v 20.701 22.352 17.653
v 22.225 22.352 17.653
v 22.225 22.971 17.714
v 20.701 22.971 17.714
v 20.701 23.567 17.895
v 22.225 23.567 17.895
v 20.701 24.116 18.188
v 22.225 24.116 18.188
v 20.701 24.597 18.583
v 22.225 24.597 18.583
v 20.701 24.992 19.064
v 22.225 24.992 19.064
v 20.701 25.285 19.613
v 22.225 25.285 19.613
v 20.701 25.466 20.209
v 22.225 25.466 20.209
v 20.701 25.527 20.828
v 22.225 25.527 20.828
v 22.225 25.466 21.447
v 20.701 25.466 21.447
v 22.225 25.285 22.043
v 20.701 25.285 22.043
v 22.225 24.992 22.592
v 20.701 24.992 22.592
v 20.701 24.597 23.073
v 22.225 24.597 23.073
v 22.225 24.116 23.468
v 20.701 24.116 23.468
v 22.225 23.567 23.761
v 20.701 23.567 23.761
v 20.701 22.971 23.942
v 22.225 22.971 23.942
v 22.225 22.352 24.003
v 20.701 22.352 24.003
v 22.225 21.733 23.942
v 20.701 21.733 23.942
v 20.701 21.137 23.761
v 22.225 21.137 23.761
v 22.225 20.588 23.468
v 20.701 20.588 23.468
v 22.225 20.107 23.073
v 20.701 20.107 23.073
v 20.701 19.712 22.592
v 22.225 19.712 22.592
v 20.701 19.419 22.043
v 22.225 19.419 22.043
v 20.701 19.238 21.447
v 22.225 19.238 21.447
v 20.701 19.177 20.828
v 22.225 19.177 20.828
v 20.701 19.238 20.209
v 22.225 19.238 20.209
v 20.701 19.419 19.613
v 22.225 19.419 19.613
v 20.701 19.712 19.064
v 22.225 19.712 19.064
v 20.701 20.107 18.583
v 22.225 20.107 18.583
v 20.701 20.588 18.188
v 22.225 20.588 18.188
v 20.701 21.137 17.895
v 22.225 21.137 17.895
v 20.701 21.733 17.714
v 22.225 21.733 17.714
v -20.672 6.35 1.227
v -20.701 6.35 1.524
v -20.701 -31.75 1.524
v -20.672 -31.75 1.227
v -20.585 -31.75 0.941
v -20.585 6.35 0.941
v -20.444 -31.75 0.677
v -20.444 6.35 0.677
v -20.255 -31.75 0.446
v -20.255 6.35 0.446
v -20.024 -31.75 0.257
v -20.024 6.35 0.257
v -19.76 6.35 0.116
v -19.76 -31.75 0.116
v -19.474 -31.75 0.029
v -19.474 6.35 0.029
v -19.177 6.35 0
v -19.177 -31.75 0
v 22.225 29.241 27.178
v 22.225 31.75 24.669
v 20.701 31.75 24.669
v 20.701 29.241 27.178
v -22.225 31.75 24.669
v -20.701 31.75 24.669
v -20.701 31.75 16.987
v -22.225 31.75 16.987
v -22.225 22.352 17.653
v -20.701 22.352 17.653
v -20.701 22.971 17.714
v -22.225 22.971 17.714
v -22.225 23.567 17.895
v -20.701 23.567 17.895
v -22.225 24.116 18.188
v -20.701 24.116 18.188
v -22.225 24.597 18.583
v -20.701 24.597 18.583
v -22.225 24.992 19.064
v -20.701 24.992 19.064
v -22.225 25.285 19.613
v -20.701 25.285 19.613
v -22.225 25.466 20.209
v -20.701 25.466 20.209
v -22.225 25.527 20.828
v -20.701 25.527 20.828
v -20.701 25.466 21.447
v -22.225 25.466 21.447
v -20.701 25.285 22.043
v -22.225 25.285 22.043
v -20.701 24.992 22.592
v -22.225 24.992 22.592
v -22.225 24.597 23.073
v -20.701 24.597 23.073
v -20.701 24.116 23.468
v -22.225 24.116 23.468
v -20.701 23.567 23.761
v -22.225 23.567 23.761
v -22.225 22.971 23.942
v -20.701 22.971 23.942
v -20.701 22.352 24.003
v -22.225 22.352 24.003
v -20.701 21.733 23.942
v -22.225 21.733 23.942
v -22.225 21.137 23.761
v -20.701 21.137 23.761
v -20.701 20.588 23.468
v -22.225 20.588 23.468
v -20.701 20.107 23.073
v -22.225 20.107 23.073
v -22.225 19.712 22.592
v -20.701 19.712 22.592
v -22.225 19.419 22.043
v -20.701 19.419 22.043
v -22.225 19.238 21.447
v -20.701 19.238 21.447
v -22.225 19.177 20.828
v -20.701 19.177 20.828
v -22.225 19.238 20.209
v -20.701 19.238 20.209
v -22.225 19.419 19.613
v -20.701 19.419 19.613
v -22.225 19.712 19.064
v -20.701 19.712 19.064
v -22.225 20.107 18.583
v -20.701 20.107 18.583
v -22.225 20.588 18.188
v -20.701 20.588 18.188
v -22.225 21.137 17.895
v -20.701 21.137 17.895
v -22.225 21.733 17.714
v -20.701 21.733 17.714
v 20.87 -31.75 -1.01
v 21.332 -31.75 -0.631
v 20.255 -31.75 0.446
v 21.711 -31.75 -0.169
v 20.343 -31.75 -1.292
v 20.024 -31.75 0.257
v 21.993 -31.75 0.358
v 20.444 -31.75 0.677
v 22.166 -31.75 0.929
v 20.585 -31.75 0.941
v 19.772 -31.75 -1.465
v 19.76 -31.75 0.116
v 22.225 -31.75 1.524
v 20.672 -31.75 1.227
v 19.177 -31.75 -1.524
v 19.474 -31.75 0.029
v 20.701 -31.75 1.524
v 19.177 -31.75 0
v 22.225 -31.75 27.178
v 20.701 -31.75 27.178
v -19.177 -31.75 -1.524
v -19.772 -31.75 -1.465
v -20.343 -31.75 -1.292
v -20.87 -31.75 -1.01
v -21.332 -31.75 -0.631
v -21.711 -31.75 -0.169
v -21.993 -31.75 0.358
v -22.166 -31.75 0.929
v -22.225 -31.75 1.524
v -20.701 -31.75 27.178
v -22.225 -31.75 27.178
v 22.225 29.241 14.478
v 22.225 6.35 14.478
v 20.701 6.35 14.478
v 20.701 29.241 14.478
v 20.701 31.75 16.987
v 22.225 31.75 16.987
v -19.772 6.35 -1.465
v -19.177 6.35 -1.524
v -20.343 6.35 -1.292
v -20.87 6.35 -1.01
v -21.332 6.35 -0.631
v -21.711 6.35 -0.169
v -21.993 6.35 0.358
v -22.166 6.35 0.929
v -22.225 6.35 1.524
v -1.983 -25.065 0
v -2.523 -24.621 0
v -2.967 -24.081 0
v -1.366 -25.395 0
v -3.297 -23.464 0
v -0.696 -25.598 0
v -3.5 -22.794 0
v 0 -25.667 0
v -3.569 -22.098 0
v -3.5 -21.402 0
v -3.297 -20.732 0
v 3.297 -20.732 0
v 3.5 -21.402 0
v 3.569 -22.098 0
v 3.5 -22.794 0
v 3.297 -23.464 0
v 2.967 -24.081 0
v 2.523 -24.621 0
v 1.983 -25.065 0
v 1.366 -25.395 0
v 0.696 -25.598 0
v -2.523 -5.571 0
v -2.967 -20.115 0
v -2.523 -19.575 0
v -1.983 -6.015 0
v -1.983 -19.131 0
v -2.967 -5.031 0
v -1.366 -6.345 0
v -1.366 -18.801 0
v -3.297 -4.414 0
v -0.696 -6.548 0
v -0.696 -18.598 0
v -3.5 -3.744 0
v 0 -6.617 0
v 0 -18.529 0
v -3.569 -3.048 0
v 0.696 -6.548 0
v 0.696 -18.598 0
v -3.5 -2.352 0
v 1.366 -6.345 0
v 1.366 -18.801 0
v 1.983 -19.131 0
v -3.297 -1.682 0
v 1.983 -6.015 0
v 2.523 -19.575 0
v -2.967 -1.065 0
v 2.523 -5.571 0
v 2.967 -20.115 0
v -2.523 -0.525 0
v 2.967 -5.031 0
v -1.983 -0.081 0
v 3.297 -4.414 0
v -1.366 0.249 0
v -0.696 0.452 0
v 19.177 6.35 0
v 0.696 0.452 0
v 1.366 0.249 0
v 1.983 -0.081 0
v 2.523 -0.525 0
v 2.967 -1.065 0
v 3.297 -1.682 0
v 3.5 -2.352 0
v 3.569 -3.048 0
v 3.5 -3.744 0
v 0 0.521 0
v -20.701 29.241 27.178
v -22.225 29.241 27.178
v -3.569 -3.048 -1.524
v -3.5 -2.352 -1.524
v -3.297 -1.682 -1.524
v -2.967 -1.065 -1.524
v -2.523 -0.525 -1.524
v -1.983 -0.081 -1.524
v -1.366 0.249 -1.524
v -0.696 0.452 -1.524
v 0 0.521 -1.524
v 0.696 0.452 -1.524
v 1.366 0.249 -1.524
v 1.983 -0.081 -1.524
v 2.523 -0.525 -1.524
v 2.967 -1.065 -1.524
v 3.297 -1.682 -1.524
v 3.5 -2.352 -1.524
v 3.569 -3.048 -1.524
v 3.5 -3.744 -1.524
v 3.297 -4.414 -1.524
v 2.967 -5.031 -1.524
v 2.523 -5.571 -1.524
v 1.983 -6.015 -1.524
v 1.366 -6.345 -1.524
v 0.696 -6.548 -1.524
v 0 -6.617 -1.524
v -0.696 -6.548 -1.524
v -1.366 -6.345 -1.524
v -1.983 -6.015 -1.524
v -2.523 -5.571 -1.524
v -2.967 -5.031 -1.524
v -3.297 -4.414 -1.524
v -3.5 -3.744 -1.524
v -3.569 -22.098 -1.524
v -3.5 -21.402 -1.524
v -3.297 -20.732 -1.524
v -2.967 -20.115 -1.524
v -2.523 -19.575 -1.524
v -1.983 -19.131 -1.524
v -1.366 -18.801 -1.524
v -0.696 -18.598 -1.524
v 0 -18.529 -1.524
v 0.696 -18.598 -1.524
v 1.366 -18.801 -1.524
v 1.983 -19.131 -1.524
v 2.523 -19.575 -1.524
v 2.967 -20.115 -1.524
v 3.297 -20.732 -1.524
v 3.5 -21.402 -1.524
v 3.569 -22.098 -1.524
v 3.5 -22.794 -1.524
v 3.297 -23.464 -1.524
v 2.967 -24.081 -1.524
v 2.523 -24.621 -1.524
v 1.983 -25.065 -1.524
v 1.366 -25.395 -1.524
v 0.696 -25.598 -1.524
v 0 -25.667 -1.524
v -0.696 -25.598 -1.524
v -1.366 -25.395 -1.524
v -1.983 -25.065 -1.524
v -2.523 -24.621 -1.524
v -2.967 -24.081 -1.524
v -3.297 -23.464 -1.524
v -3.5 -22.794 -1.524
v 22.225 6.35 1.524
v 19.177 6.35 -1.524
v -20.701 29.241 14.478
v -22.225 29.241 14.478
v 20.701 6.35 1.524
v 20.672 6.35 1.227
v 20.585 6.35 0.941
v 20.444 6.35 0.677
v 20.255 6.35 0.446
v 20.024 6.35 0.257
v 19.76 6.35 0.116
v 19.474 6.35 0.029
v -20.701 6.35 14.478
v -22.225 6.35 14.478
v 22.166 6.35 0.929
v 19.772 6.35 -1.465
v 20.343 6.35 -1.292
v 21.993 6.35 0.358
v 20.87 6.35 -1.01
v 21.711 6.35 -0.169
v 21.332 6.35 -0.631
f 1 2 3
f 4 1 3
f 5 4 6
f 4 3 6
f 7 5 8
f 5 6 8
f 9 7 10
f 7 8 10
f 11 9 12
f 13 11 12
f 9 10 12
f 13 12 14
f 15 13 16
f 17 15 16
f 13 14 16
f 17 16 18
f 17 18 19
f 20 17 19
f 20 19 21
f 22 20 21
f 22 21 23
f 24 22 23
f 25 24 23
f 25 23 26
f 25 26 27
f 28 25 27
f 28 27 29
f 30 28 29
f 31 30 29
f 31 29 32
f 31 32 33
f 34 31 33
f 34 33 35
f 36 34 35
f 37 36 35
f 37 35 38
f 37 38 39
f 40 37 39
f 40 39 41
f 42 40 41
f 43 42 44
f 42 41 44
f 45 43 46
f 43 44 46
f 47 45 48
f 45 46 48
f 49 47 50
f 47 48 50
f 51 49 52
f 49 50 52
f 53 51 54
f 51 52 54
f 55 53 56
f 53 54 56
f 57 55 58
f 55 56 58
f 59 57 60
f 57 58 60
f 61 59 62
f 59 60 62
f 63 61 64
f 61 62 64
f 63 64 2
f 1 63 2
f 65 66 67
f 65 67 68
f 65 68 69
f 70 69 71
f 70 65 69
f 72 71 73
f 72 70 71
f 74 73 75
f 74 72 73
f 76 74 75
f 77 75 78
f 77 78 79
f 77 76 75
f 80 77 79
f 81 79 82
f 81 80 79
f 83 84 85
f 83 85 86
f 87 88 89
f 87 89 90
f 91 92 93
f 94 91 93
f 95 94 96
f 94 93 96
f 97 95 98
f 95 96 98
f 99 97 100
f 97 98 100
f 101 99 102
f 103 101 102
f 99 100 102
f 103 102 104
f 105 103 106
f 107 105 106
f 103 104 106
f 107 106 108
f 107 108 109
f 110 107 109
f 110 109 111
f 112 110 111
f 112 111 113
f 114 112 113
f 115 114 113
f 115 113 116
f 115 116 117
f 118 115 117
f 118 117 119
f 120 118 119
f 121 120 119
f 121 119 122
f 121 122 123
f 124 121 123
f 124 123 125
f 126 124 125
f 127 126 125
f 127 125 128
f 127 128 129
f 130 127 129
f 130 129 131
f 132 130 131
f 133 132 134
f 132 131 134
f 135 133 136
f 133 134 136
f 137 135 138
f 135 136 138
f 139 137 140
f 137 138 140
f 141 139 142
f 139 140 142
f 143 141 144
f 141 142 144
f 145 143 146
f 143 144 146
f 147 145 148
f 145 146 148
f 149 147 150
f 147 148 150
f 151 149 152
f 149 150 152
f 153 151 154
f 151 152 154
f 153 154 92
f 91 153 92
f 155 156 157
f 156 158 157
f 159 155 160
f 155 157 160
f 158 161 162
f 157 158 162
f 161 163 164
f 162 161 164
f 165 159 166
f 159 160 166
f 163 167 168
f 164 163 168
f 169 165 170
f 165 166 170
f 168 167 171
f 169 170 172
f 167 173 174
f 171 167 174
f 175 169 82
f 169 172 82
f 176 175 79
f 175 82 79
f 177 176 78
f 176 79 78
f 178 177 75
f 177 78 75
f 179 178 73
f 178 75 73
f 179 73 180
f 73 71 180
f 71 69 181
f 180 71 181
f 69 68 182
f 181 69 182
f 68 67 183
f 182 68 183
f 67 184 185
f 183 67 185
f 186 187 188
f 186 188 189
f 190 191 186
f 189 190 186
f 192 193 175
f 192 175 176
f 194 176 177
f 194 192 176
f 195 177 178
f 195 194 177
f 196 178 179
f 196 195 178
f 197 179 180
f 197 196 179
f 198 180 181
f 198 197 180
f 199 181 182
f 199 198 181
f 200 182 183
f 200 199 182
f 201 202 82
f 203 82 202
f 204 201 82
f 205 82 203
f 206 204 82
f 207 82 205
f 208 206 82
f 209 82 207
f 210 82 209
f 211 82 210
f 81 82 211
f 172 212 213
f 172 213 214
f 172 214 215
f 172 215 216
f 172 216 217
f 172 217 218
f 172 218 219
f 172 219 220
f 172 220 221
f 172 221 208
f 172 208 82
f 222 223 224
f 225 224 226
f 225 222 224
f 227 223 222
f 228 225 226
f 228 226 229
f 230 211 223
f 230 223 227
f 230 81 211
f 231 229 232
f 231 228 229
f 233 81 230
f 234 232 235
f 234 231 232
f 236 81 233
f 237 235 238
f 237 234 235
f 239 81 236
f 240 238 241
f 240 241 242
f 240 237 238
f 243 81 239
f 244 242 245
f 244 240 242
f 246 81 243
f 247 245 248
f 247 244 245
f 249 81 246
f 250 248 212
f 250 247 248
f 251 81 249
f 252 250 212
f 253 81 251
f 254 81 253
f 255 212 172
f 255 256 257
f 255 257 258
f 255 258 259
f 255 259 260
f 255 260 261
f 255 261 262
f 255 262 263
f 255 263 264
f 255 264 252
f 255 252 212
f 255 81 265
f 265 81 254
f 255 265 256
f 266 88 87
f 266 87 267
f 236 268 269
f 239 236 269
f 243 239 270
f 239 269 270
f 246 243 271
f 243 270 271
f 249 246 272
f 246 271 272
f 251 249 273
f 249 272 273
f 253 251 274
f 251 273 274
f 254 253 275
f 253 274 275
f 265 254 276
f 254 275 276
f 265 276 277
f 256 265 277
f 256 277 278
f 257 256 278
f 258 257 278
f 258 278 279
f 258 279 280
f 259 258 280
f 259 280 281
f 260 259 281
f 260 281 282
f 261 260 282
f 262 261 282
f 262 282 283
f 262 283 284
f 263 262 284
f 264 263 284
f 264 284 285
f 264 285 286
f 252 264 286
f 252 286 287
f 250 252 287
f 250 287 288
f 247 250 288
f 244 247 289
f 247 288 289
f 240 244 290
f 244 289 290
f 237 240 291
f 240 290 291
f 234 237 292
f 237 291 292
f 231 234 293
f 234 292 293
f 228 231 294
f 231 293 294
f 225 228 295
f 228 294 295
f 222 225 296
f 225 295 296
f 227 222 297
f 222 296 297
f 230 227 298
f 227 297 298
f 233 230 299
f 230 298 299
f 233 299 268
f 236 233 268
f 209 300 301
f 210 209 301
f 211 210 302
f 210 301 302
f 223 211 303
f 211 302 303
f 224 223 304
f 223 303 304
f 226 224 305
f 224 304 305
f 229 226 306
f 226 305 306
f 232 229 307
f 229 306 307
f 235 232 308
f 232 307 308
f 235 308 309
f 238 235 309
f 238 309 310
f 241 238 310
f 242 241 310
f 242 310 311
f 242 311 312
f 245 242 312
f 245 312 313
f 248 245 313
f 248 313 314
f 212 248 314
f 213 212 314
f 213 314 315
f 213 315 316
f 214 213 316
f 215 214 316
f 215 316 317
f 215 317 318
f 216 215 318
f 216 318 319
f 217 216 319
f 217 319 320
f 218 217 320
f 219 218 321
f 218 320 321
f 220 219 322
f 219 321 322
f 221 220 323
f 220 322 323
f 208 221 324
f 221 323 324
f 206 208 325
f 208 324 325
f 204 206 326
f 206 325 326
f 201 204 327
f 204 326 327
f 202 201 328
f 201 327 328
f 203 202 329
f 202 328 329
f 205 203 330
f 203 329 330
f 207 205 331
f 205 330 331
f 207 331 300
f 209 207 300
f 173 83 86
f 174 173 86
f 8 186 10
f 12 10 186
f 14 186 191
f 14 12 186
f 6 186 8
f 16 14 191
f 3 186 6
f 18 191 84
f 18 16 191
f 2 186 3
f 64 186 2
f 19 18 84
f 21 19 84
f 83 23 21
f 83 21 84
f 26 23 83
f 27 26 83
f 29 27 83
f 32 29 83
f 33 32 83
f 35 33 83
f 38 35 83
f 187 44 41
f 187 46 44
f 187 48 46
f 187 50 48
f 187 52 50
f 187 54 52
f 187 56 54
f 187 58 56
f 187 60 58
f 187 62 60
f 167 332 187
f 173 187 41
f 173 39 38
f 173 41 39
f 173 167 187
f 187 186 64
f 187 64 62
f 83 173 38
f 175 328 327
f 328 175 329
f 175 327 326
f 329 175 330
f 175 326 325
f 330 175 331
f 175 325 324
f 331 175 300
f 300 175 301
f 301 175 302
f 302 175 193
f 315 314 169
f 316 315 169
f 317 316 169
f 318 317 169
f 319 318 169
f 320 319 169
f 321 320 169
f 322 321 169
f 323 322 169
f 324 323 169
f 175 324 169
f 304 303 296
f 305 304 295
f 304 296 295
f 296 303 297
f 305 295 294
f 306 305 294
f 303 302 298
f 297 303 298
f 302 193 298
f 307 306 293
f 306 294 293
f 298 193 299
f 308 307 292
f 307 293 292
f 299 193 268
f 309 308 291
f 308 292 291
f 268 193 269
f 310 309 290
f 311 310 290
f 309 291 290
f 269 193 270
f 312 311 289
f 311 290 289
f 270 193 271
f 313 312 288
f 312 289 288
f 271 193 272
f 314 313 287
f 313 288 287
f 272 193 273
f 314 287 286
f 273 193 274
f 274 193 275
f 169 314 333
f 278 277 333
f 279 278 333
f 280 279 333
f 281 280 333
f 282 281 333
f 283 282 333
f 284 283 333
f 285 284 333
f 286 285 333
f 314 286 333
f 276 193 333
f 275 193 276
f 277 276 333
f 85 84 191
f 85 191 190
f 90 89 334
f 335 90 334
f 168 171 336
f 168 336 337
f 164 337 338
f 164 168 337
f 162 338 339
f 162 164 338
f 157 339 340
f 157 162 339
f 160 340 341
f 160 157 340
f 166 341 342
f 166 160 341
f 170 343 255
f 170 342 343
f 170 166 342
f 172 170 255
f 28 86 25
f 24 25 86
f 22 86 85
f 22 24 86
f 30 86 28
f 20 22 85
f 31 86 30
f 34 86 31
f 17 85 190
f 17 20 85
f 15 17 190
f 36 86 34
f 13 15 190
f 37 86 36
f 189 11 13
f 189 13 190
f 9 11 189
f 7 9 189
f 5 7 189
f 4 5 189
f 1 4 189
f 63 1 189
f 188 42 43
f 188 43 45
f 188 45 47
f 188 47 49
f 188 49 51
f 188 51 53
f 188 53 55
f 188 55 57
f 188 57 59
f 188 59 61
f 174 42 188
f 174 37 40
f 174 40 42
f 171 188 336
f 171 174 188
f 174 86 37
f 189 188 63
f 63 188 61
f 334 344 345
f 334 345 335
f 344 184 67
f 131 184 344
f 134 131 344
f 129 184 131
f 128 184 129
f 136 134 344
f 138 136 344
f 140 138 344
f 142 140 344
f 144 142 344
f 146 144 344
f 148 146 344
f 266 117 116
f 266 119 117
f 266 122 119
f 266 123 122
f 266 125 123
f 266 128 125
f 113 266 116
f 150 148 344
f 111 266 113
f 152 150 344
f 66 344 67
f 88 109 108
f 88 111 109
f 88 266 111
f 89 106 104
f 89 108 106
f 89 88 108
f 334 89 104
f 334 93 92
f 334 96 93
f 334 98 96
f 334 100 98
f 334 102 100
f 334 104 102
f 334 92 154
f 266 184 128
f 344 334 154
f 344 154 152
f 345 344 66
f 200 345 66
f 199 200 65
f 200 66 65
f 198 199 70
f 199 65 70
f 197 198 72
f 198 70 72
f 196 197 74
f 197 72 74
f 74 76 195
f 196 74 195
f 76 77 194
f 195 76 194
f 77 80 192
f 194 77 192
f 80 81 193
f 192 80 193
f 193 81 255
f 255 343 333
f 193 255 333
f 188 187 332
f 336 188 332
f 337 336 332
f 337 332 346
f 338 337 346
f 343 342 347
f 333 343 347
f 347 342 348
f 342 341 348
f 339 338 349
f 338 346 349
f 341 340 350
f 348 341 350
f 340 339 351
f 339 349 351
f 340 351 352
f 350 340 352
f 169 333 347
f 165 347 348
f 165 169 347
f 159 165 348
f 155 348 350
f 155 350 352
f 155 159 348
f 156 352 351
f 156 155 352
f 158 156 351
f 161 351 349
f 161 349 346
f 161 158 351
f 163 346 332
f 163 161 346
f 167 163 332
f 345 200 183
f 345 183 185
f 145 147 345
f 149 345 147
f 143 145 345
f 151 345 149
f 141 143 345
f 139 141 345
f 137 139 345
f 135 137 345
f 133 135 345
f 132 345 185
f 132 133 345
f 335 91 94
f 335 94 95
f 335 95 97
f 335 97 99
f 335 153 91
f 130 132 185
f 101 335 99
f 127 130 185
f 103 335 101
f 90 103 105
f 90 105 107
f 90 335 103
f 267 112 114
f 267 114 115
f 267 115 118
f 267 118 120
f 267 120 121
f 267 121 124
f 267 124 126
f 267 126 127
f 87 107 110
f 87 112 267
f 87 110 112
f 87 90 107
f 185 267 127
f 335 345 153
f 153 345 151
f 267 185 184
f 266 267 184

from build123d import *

# Parameters (mm, degrees)
CROQUIS1_W                         = 44.45
CROQUIS1_H                         = 63.5
BRIDA_BASE1_DEPTH                  = 1.524
BRIDA_DE_ARISTA1_STRIP_W           = 9.144
BRIDA_DE_ARISTA1_STRIP_H           = 1.524
BRIDA_DE_ARISTA1_STRIP_CUT_DEPTH   = 63.5
BRIDA_DE_ARISTA1_STRIP_2_W         = 9.144
BRIDA_DE_ARISTA1_STRIP_2_H         = 1.524
BRIDA_DE_ARISTA1_STRIP_CUT_2_DEPTH = 63.5
BRIDA_DE_ARISTA1_DEPTH             = 63.5
BRIDA_DE_ARISTA1_BEND_DEPTH        = 63.5
CROQUIS12_R                        = 3.175
CROQUIS12_W                        = 16.002
CROQUIS12_H                        = 25.4
CORTAR_EXTRUIR1_DEPTH              = 62.738
CROQUIS13_R                        = 3.5687
CORTAR_EXTRUIR2_DEPTH              = 62.738
CORTAR_EXTRUIR3_DEPTH              = 62.738


# Sheet-metal steps are written as plain solids
with BuildPart() as part:
    # Croquis1 → Brida base1 (new body)
    with BuildSketch(Plane.XY):
        Rectangle(CROQUIS1_W, CROQUIS1_H)
    extrude(amount=-BRIDA_BASE1_DEPTH)

    # Brida de arista1 strip (across the edge) → Brida de arista1 strip cut (cut)
    with BuildSketch(Plane(origin=(22.225, -31.75, 0), x_dir=(-1, 0, 0), z_dir=(0, 1, 0))):
        with Locations((-1.524, -0.762)):
            Rectangle(BRIDA_DE_ARISTA1_STRIP_W, BRIDA_DE_ARISTA1_STRIP_H)
    extrude(amount=BRIDA_DE_ARISTA1_STRIP_CUT_DEPTH, mode=Mode.SUBTRACT)

    # Brida de arista1 strip 2 (across the edge) → Brida de arista1 strip cut 2 (cut)
    with BuildSketch(Plane(origin=(-22.225, 31.75, 0), x_dir=(1, 0, 0), z_dir=(0, -1, 0))):
        with Locations((-1.524, -0.762)):
            Rectangle(BRIDA_DE_ARISTA1_STRIP_2_W, BRIDA_DE_ARISTA1_STRIP_2_H)
    extrude(amount=BRIDA_DE_ARISTA1_STRIP_CUT_2_DEPTH, mode=Mode.SUBTRACT)

    # Brida de arista1 section (across the edge) → Brida de arista1 (add)
    with BuildSketch(Plane(origin=(22.225, -31.75, 0), x_dir=(-1, 0, 0), z_dir=(0, 1, 0))):
        with BuildLine():
            Line((0, 1.524), (0, 27.178))
            Line((0, 27.178), (1.524, 27.178))
            Line((1.524, 27.178), (1.524, 1.524))
            ThreePointArc((1.524, 1.524), (1.970369265, 0.446369265), (3.048, 0))
            Line((3.048, 0), (3.048, -1.524))
            ThreePointArc((3.048, -1.524), (0.892738531, -0.631261469), (0, 1.524))
        make_face()
    extrude(amount=BRIDA_DE_ARISTA1_DEPTH)

    # Brida de arista1 section 2 (across the edge) → Brida de arista1 bend (add)
    with BuildSketch(Plane(origin=(-22.225, 31.75, 0), x_dir=(1, 0, 0), z_dir=(0, -1, 0))):
        with BuildLine():
            Line((0, 1.524), (0, 27.178))
            Line((0, 27.178), (1.524, 27.178))
            Line((1.524, 27.178), (1.524, 1.524))
            ThreePointArc((1.524, 1.524), (1.970369265, 0.446369265), (3.048, 0))
            Line((3.048, 0), (3.048, -1.524))
            ThreePointArc((3.048, -1.524), (0.892738531, -0.631261469), (0, 1.524))
        make_face()
    extrude(amount=BRIDA_DE_ARISTA1_BEND_DEPTH)

    # Croquis12 → Cortar-Extruir1 (cut)
    with BuildSketch(Plane(origin=(22.225, 0, 0), x_dir=(0, 0, -1), z_dir=(1, 0, 0))):
        with Locations((-20.828, 22.352)):
            Circle(CROQUIS12_R)
        with Locations((-6.477, 19.05)):
            Rectangle(CROQUIS12_W, CROQUIS12_H)
    extrude(amount=-CORTAR_EXTRUIR1_DEPTH, mode=Mode.SUBTRACT)

    # Croquis13 → Cortar-Extruir2 (cut)
    with BuildSketch(Plane(origin=(0, 0, -1.524), x_dir=(-1, 0, 0), z_dir=(0, 0, -1))):
        with Locations((0, -22.098)):
            Circle(CROQUIS13_R)
        with Locations((0, -3.048)):
            Circle(CROQUIS13_R)
    extrude(amount=-CORTAR_EXTRUIR2_DEPTH, mode=Mode.SUBTRACT)

    # Croquis14 → Cortar-Extruir3 (cut)
    with BuildSketch(Plane(origin=(22.225, 0, 0), x_dir=(0, 0, -1), z_dir=(1, 0, 0))):
        Polygon((-14.478, 31.75), (-16.986914912, 31.75), (-14.478, 29.241085088), align=None)
        Polygon((-27.178, 31.75), (-24.669085088, 31.75), (-27.178, 29.241085088), align=None)
    extrude(amount=-CORTAR_EXTRUIR3_DEPTH, mode=Mode.SUBTRACT)


solid = part.part
